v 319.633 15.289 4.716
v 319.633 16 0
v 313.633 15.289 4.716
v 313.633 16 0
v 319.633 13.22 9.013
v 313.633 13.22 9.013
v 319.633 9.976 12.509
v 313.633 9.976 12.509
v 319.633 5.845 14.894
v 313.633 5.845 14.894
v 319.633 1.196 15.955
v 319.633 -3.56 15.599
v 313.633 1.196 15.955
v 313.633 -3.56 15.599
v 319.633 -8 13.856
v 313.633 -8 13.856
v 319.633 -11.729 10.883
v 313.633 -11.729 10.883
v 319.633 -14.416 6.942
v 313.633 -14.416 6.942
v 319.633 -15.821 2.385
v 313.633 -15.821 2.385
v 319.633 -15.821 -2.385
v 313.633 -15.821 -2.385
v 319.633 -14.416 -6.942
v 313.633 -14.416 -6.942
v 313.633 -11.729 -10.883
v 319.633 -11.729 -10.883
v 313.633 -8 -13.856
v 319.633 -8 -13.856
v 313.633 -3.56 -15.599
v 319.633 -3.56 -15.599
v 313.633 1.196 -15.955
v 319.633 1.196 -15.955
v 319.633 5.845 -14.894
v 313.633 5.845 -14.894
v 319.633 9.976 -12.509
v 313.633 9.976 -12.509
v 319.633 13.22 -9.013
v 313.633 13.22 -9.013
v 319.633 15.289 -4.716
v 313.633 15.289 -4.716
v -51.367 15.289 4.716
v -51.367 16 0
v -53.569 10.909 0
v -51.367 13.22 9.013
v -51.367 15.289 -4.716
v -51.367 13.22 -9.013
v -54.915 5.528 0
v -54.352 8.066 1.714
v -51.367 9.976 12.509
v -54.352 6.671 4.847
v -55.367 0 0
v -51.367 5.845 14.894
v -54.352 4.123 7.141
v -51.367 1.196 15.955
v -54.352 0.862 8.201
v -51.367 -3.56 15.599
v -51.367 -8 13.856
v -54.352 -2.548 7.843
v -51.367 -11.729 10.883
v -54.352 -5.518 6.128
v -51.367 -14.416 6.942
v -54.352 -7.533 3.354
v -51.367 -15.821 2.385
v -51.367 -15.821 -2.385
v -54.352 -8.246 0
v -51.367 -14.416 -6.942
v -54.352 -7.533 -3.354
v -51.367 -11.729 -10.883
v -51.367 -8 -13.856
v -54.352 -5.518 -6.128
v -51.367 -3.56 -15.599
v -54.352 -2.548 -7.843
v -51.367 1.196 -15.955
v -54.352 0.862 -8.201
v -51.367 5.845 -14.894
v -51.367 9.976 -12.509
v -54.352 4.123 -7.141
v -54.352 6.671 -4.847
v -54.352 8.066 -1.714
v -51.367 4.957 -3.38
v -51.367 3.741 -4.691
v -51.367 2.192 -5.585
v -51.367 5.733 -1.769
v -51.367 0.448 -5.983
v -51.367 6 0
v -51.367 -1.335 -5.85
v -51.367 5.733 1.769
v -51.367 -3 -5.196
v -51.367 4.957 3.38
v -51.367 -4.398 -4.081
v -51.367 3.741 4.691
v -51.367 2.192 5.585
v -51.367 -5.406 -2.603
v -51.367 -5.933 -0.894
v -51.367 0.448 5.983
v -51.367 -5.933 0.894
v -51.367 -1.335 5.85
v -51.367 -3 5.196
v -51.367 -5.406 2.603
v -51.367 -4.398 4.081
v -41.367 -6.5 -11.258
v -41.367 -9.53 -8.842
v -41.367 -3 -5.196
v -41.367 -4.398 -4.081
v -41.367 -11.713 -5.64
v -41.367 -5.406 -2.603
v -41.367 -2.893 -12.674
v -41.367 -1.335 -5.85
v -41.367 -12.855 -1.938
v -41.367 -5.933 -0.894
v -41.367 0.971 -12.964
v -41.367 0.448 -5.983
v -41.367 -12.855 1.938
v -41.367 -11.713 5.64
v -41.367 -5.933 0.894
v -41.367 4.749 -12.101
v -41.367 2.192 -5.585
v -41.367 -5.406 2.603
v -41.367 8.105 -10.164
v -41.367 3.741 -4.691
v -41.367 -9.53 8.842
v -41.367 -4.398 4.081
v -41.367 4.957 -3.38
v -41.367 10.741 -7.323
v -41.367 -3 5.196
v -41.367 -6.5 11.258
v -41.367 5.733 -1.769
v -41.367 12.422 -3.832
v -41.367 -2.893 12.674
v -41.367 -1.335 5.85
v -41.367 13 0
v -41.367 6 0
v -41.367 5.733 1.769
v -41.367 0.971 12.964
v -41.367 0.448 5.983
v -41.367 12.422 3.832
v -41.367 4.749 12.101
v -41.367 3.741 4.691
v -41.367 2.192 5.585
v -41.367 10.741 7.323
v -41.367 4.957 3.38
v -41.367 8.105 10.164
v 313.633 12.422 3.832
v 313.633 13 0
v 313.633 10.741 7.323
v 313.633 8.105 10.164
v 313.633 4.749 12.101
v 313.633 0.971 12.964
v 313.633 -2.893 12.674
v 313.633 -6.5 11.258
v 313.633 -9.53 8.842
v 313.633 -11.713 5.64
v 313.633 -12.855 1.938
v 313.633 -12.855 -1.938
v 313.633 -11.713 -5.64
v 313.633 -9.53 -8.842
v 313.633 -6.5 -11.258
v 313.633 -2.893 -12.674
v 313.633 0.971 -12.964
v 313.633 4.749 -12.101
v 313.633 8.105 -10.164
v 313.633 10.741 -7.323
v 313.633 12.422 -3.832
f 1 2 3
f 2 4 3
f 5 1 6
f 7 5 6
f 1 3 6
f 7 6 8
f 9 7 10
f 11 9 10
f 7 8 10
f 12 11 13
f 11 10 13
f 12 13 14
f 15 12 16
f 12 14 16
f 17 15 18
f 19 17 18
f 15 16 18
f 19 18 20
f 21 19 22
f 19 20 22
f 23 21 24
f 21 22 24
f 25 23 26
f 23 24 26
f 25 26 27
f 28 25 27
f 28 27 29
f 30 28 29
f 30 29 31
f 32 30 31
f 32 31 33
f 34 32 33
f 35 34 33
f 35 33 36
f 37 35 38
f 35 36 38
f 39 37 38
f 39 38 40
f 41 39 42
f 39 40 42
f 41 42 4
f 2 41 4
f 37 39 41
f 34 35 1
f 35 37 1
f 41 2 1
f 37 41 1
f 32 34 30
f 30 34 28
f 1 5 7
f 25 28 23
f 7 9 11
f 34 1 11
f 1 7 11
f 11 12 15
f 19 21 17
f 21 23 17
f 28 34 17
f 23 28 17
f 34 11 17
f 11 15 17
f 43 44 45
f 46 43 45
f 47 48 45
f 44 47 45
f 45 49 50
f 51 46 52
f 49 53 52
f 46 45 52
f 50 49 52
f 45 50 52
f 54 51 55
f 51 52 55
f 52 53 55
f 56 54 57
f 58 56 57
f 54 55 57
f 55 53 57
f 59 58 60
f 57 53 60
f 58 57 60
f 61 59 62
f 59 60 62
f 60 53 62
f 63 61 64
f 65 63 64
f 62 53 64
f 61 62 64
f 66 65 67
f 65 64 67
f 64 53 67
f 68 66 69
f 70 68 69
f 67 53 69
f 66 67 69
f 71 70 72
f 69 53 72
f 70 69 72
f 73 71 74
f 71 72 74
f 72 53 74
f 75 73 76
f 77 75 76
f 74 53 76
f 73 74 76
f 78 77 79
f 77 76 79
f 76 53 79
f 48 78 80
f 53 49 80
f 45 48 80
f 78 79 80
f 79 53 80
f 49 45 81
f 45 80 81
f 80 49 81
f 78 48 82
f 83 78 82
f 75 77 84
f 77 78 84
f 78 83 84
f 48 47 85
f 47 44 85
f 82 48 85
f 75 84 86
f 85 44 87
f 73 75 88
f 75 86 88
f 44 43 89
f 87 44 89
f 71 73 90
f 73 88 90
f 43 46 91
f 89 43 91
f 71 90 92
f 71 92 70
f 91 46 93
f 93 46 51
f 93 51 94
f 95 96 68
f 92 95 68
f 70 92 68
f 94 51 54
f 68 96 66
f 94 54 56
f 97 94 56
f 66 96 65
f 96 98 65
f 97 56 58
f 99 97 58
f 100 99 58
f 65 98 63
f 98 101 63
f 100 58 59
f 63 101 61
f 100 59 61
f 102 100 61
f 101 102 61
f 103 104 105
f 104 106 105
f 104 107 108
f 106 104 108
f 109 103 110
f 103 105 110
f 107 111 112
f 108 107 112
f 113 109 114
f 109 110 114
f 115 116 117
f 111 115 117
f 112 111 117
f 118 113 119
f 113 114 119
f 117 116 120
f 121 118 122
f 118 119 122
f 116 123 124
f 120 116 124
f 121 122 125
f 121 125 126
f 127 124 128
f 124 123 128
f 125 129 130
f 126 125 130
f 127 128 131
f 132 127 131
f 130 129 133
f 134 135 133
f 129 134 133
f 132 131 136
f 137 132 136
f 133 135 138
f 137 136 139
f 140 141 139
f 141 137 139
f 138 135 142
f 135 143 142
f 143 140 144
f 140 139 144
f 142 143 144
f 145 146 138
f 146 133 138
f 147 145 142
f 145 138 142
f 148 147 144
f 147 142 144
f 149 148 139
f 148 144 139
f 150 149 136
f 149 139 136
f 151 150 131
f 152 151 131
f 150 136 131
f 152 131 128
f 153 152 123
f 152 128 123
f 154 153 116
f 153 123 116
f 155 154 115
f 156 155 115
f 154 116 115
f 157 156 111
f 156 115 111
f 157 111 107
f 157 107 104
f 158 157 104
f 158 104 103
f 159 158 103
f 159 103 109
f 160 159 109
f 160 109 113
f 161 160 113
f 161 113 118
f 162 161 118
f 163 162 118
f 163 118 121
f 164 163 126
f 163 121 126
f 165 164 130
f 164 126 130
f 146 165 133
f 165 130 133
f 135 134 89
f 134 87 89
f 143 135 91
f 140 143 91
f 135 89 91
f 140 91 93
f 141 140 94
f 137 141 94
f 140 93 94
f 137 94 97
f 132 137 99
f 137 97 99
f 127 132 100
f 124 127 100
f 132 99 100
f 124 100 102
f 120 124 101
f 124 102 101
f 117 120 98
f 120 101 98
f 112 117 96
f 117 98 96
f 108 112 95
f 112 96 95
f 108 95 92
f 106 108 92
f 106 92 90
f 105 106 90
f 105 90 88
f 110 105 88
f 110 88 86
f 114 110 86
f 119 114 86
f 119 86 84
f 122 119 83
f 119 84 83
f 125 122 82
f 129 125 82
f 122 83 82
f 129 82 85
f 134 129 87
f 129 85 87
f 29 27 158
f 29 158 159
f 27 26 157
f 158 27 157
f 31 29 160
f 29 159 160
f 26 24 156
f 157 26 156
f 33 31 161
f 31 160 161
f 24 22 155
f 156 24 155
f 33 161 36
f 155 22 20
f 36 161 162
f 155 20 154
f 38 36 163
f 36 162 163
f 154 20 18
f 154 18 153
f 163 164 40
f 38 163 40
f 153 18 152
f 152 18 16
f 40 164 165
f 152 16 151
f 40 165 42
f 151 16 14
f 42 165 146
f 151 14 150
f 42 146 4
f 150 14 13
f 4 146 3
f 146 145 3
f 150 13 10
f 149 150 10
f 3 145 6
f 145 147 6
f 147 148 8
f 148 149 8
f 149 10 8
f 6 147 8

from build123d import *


with BuildPart() as part:
    # Sketch1 → Revolve1 (revolve)
    with BuildSketch(Plane.XY):
        with BuildLine():
            Line((319.632932386, 0), (319.632932386, 16))
            Line((319.632932386, 16), (313.632932386, 16))
            Line((313.632932386, 16), (313.632932386, 13))
            Line((313.632932386, 13), (-41.367067614, 13))
            Line((-41.367067614, 13), (-41.367067614, 6))
            Line((-41.367067614, 6), (-51.367067614, 6))
            Line((-51.367067614, 6), (-51.367067614, 16))
            ThreePointArc((-51.367067614, 16), (-54.351912619, 8.246211251), (-55.367067614, 0))
            Line((-55.367067614, 0), (319.632932386, 0))
        make_face()
    revolve(axis=Axis((-129.812073534, 0, 0), (1, 0, 0)))


solid = part.part
